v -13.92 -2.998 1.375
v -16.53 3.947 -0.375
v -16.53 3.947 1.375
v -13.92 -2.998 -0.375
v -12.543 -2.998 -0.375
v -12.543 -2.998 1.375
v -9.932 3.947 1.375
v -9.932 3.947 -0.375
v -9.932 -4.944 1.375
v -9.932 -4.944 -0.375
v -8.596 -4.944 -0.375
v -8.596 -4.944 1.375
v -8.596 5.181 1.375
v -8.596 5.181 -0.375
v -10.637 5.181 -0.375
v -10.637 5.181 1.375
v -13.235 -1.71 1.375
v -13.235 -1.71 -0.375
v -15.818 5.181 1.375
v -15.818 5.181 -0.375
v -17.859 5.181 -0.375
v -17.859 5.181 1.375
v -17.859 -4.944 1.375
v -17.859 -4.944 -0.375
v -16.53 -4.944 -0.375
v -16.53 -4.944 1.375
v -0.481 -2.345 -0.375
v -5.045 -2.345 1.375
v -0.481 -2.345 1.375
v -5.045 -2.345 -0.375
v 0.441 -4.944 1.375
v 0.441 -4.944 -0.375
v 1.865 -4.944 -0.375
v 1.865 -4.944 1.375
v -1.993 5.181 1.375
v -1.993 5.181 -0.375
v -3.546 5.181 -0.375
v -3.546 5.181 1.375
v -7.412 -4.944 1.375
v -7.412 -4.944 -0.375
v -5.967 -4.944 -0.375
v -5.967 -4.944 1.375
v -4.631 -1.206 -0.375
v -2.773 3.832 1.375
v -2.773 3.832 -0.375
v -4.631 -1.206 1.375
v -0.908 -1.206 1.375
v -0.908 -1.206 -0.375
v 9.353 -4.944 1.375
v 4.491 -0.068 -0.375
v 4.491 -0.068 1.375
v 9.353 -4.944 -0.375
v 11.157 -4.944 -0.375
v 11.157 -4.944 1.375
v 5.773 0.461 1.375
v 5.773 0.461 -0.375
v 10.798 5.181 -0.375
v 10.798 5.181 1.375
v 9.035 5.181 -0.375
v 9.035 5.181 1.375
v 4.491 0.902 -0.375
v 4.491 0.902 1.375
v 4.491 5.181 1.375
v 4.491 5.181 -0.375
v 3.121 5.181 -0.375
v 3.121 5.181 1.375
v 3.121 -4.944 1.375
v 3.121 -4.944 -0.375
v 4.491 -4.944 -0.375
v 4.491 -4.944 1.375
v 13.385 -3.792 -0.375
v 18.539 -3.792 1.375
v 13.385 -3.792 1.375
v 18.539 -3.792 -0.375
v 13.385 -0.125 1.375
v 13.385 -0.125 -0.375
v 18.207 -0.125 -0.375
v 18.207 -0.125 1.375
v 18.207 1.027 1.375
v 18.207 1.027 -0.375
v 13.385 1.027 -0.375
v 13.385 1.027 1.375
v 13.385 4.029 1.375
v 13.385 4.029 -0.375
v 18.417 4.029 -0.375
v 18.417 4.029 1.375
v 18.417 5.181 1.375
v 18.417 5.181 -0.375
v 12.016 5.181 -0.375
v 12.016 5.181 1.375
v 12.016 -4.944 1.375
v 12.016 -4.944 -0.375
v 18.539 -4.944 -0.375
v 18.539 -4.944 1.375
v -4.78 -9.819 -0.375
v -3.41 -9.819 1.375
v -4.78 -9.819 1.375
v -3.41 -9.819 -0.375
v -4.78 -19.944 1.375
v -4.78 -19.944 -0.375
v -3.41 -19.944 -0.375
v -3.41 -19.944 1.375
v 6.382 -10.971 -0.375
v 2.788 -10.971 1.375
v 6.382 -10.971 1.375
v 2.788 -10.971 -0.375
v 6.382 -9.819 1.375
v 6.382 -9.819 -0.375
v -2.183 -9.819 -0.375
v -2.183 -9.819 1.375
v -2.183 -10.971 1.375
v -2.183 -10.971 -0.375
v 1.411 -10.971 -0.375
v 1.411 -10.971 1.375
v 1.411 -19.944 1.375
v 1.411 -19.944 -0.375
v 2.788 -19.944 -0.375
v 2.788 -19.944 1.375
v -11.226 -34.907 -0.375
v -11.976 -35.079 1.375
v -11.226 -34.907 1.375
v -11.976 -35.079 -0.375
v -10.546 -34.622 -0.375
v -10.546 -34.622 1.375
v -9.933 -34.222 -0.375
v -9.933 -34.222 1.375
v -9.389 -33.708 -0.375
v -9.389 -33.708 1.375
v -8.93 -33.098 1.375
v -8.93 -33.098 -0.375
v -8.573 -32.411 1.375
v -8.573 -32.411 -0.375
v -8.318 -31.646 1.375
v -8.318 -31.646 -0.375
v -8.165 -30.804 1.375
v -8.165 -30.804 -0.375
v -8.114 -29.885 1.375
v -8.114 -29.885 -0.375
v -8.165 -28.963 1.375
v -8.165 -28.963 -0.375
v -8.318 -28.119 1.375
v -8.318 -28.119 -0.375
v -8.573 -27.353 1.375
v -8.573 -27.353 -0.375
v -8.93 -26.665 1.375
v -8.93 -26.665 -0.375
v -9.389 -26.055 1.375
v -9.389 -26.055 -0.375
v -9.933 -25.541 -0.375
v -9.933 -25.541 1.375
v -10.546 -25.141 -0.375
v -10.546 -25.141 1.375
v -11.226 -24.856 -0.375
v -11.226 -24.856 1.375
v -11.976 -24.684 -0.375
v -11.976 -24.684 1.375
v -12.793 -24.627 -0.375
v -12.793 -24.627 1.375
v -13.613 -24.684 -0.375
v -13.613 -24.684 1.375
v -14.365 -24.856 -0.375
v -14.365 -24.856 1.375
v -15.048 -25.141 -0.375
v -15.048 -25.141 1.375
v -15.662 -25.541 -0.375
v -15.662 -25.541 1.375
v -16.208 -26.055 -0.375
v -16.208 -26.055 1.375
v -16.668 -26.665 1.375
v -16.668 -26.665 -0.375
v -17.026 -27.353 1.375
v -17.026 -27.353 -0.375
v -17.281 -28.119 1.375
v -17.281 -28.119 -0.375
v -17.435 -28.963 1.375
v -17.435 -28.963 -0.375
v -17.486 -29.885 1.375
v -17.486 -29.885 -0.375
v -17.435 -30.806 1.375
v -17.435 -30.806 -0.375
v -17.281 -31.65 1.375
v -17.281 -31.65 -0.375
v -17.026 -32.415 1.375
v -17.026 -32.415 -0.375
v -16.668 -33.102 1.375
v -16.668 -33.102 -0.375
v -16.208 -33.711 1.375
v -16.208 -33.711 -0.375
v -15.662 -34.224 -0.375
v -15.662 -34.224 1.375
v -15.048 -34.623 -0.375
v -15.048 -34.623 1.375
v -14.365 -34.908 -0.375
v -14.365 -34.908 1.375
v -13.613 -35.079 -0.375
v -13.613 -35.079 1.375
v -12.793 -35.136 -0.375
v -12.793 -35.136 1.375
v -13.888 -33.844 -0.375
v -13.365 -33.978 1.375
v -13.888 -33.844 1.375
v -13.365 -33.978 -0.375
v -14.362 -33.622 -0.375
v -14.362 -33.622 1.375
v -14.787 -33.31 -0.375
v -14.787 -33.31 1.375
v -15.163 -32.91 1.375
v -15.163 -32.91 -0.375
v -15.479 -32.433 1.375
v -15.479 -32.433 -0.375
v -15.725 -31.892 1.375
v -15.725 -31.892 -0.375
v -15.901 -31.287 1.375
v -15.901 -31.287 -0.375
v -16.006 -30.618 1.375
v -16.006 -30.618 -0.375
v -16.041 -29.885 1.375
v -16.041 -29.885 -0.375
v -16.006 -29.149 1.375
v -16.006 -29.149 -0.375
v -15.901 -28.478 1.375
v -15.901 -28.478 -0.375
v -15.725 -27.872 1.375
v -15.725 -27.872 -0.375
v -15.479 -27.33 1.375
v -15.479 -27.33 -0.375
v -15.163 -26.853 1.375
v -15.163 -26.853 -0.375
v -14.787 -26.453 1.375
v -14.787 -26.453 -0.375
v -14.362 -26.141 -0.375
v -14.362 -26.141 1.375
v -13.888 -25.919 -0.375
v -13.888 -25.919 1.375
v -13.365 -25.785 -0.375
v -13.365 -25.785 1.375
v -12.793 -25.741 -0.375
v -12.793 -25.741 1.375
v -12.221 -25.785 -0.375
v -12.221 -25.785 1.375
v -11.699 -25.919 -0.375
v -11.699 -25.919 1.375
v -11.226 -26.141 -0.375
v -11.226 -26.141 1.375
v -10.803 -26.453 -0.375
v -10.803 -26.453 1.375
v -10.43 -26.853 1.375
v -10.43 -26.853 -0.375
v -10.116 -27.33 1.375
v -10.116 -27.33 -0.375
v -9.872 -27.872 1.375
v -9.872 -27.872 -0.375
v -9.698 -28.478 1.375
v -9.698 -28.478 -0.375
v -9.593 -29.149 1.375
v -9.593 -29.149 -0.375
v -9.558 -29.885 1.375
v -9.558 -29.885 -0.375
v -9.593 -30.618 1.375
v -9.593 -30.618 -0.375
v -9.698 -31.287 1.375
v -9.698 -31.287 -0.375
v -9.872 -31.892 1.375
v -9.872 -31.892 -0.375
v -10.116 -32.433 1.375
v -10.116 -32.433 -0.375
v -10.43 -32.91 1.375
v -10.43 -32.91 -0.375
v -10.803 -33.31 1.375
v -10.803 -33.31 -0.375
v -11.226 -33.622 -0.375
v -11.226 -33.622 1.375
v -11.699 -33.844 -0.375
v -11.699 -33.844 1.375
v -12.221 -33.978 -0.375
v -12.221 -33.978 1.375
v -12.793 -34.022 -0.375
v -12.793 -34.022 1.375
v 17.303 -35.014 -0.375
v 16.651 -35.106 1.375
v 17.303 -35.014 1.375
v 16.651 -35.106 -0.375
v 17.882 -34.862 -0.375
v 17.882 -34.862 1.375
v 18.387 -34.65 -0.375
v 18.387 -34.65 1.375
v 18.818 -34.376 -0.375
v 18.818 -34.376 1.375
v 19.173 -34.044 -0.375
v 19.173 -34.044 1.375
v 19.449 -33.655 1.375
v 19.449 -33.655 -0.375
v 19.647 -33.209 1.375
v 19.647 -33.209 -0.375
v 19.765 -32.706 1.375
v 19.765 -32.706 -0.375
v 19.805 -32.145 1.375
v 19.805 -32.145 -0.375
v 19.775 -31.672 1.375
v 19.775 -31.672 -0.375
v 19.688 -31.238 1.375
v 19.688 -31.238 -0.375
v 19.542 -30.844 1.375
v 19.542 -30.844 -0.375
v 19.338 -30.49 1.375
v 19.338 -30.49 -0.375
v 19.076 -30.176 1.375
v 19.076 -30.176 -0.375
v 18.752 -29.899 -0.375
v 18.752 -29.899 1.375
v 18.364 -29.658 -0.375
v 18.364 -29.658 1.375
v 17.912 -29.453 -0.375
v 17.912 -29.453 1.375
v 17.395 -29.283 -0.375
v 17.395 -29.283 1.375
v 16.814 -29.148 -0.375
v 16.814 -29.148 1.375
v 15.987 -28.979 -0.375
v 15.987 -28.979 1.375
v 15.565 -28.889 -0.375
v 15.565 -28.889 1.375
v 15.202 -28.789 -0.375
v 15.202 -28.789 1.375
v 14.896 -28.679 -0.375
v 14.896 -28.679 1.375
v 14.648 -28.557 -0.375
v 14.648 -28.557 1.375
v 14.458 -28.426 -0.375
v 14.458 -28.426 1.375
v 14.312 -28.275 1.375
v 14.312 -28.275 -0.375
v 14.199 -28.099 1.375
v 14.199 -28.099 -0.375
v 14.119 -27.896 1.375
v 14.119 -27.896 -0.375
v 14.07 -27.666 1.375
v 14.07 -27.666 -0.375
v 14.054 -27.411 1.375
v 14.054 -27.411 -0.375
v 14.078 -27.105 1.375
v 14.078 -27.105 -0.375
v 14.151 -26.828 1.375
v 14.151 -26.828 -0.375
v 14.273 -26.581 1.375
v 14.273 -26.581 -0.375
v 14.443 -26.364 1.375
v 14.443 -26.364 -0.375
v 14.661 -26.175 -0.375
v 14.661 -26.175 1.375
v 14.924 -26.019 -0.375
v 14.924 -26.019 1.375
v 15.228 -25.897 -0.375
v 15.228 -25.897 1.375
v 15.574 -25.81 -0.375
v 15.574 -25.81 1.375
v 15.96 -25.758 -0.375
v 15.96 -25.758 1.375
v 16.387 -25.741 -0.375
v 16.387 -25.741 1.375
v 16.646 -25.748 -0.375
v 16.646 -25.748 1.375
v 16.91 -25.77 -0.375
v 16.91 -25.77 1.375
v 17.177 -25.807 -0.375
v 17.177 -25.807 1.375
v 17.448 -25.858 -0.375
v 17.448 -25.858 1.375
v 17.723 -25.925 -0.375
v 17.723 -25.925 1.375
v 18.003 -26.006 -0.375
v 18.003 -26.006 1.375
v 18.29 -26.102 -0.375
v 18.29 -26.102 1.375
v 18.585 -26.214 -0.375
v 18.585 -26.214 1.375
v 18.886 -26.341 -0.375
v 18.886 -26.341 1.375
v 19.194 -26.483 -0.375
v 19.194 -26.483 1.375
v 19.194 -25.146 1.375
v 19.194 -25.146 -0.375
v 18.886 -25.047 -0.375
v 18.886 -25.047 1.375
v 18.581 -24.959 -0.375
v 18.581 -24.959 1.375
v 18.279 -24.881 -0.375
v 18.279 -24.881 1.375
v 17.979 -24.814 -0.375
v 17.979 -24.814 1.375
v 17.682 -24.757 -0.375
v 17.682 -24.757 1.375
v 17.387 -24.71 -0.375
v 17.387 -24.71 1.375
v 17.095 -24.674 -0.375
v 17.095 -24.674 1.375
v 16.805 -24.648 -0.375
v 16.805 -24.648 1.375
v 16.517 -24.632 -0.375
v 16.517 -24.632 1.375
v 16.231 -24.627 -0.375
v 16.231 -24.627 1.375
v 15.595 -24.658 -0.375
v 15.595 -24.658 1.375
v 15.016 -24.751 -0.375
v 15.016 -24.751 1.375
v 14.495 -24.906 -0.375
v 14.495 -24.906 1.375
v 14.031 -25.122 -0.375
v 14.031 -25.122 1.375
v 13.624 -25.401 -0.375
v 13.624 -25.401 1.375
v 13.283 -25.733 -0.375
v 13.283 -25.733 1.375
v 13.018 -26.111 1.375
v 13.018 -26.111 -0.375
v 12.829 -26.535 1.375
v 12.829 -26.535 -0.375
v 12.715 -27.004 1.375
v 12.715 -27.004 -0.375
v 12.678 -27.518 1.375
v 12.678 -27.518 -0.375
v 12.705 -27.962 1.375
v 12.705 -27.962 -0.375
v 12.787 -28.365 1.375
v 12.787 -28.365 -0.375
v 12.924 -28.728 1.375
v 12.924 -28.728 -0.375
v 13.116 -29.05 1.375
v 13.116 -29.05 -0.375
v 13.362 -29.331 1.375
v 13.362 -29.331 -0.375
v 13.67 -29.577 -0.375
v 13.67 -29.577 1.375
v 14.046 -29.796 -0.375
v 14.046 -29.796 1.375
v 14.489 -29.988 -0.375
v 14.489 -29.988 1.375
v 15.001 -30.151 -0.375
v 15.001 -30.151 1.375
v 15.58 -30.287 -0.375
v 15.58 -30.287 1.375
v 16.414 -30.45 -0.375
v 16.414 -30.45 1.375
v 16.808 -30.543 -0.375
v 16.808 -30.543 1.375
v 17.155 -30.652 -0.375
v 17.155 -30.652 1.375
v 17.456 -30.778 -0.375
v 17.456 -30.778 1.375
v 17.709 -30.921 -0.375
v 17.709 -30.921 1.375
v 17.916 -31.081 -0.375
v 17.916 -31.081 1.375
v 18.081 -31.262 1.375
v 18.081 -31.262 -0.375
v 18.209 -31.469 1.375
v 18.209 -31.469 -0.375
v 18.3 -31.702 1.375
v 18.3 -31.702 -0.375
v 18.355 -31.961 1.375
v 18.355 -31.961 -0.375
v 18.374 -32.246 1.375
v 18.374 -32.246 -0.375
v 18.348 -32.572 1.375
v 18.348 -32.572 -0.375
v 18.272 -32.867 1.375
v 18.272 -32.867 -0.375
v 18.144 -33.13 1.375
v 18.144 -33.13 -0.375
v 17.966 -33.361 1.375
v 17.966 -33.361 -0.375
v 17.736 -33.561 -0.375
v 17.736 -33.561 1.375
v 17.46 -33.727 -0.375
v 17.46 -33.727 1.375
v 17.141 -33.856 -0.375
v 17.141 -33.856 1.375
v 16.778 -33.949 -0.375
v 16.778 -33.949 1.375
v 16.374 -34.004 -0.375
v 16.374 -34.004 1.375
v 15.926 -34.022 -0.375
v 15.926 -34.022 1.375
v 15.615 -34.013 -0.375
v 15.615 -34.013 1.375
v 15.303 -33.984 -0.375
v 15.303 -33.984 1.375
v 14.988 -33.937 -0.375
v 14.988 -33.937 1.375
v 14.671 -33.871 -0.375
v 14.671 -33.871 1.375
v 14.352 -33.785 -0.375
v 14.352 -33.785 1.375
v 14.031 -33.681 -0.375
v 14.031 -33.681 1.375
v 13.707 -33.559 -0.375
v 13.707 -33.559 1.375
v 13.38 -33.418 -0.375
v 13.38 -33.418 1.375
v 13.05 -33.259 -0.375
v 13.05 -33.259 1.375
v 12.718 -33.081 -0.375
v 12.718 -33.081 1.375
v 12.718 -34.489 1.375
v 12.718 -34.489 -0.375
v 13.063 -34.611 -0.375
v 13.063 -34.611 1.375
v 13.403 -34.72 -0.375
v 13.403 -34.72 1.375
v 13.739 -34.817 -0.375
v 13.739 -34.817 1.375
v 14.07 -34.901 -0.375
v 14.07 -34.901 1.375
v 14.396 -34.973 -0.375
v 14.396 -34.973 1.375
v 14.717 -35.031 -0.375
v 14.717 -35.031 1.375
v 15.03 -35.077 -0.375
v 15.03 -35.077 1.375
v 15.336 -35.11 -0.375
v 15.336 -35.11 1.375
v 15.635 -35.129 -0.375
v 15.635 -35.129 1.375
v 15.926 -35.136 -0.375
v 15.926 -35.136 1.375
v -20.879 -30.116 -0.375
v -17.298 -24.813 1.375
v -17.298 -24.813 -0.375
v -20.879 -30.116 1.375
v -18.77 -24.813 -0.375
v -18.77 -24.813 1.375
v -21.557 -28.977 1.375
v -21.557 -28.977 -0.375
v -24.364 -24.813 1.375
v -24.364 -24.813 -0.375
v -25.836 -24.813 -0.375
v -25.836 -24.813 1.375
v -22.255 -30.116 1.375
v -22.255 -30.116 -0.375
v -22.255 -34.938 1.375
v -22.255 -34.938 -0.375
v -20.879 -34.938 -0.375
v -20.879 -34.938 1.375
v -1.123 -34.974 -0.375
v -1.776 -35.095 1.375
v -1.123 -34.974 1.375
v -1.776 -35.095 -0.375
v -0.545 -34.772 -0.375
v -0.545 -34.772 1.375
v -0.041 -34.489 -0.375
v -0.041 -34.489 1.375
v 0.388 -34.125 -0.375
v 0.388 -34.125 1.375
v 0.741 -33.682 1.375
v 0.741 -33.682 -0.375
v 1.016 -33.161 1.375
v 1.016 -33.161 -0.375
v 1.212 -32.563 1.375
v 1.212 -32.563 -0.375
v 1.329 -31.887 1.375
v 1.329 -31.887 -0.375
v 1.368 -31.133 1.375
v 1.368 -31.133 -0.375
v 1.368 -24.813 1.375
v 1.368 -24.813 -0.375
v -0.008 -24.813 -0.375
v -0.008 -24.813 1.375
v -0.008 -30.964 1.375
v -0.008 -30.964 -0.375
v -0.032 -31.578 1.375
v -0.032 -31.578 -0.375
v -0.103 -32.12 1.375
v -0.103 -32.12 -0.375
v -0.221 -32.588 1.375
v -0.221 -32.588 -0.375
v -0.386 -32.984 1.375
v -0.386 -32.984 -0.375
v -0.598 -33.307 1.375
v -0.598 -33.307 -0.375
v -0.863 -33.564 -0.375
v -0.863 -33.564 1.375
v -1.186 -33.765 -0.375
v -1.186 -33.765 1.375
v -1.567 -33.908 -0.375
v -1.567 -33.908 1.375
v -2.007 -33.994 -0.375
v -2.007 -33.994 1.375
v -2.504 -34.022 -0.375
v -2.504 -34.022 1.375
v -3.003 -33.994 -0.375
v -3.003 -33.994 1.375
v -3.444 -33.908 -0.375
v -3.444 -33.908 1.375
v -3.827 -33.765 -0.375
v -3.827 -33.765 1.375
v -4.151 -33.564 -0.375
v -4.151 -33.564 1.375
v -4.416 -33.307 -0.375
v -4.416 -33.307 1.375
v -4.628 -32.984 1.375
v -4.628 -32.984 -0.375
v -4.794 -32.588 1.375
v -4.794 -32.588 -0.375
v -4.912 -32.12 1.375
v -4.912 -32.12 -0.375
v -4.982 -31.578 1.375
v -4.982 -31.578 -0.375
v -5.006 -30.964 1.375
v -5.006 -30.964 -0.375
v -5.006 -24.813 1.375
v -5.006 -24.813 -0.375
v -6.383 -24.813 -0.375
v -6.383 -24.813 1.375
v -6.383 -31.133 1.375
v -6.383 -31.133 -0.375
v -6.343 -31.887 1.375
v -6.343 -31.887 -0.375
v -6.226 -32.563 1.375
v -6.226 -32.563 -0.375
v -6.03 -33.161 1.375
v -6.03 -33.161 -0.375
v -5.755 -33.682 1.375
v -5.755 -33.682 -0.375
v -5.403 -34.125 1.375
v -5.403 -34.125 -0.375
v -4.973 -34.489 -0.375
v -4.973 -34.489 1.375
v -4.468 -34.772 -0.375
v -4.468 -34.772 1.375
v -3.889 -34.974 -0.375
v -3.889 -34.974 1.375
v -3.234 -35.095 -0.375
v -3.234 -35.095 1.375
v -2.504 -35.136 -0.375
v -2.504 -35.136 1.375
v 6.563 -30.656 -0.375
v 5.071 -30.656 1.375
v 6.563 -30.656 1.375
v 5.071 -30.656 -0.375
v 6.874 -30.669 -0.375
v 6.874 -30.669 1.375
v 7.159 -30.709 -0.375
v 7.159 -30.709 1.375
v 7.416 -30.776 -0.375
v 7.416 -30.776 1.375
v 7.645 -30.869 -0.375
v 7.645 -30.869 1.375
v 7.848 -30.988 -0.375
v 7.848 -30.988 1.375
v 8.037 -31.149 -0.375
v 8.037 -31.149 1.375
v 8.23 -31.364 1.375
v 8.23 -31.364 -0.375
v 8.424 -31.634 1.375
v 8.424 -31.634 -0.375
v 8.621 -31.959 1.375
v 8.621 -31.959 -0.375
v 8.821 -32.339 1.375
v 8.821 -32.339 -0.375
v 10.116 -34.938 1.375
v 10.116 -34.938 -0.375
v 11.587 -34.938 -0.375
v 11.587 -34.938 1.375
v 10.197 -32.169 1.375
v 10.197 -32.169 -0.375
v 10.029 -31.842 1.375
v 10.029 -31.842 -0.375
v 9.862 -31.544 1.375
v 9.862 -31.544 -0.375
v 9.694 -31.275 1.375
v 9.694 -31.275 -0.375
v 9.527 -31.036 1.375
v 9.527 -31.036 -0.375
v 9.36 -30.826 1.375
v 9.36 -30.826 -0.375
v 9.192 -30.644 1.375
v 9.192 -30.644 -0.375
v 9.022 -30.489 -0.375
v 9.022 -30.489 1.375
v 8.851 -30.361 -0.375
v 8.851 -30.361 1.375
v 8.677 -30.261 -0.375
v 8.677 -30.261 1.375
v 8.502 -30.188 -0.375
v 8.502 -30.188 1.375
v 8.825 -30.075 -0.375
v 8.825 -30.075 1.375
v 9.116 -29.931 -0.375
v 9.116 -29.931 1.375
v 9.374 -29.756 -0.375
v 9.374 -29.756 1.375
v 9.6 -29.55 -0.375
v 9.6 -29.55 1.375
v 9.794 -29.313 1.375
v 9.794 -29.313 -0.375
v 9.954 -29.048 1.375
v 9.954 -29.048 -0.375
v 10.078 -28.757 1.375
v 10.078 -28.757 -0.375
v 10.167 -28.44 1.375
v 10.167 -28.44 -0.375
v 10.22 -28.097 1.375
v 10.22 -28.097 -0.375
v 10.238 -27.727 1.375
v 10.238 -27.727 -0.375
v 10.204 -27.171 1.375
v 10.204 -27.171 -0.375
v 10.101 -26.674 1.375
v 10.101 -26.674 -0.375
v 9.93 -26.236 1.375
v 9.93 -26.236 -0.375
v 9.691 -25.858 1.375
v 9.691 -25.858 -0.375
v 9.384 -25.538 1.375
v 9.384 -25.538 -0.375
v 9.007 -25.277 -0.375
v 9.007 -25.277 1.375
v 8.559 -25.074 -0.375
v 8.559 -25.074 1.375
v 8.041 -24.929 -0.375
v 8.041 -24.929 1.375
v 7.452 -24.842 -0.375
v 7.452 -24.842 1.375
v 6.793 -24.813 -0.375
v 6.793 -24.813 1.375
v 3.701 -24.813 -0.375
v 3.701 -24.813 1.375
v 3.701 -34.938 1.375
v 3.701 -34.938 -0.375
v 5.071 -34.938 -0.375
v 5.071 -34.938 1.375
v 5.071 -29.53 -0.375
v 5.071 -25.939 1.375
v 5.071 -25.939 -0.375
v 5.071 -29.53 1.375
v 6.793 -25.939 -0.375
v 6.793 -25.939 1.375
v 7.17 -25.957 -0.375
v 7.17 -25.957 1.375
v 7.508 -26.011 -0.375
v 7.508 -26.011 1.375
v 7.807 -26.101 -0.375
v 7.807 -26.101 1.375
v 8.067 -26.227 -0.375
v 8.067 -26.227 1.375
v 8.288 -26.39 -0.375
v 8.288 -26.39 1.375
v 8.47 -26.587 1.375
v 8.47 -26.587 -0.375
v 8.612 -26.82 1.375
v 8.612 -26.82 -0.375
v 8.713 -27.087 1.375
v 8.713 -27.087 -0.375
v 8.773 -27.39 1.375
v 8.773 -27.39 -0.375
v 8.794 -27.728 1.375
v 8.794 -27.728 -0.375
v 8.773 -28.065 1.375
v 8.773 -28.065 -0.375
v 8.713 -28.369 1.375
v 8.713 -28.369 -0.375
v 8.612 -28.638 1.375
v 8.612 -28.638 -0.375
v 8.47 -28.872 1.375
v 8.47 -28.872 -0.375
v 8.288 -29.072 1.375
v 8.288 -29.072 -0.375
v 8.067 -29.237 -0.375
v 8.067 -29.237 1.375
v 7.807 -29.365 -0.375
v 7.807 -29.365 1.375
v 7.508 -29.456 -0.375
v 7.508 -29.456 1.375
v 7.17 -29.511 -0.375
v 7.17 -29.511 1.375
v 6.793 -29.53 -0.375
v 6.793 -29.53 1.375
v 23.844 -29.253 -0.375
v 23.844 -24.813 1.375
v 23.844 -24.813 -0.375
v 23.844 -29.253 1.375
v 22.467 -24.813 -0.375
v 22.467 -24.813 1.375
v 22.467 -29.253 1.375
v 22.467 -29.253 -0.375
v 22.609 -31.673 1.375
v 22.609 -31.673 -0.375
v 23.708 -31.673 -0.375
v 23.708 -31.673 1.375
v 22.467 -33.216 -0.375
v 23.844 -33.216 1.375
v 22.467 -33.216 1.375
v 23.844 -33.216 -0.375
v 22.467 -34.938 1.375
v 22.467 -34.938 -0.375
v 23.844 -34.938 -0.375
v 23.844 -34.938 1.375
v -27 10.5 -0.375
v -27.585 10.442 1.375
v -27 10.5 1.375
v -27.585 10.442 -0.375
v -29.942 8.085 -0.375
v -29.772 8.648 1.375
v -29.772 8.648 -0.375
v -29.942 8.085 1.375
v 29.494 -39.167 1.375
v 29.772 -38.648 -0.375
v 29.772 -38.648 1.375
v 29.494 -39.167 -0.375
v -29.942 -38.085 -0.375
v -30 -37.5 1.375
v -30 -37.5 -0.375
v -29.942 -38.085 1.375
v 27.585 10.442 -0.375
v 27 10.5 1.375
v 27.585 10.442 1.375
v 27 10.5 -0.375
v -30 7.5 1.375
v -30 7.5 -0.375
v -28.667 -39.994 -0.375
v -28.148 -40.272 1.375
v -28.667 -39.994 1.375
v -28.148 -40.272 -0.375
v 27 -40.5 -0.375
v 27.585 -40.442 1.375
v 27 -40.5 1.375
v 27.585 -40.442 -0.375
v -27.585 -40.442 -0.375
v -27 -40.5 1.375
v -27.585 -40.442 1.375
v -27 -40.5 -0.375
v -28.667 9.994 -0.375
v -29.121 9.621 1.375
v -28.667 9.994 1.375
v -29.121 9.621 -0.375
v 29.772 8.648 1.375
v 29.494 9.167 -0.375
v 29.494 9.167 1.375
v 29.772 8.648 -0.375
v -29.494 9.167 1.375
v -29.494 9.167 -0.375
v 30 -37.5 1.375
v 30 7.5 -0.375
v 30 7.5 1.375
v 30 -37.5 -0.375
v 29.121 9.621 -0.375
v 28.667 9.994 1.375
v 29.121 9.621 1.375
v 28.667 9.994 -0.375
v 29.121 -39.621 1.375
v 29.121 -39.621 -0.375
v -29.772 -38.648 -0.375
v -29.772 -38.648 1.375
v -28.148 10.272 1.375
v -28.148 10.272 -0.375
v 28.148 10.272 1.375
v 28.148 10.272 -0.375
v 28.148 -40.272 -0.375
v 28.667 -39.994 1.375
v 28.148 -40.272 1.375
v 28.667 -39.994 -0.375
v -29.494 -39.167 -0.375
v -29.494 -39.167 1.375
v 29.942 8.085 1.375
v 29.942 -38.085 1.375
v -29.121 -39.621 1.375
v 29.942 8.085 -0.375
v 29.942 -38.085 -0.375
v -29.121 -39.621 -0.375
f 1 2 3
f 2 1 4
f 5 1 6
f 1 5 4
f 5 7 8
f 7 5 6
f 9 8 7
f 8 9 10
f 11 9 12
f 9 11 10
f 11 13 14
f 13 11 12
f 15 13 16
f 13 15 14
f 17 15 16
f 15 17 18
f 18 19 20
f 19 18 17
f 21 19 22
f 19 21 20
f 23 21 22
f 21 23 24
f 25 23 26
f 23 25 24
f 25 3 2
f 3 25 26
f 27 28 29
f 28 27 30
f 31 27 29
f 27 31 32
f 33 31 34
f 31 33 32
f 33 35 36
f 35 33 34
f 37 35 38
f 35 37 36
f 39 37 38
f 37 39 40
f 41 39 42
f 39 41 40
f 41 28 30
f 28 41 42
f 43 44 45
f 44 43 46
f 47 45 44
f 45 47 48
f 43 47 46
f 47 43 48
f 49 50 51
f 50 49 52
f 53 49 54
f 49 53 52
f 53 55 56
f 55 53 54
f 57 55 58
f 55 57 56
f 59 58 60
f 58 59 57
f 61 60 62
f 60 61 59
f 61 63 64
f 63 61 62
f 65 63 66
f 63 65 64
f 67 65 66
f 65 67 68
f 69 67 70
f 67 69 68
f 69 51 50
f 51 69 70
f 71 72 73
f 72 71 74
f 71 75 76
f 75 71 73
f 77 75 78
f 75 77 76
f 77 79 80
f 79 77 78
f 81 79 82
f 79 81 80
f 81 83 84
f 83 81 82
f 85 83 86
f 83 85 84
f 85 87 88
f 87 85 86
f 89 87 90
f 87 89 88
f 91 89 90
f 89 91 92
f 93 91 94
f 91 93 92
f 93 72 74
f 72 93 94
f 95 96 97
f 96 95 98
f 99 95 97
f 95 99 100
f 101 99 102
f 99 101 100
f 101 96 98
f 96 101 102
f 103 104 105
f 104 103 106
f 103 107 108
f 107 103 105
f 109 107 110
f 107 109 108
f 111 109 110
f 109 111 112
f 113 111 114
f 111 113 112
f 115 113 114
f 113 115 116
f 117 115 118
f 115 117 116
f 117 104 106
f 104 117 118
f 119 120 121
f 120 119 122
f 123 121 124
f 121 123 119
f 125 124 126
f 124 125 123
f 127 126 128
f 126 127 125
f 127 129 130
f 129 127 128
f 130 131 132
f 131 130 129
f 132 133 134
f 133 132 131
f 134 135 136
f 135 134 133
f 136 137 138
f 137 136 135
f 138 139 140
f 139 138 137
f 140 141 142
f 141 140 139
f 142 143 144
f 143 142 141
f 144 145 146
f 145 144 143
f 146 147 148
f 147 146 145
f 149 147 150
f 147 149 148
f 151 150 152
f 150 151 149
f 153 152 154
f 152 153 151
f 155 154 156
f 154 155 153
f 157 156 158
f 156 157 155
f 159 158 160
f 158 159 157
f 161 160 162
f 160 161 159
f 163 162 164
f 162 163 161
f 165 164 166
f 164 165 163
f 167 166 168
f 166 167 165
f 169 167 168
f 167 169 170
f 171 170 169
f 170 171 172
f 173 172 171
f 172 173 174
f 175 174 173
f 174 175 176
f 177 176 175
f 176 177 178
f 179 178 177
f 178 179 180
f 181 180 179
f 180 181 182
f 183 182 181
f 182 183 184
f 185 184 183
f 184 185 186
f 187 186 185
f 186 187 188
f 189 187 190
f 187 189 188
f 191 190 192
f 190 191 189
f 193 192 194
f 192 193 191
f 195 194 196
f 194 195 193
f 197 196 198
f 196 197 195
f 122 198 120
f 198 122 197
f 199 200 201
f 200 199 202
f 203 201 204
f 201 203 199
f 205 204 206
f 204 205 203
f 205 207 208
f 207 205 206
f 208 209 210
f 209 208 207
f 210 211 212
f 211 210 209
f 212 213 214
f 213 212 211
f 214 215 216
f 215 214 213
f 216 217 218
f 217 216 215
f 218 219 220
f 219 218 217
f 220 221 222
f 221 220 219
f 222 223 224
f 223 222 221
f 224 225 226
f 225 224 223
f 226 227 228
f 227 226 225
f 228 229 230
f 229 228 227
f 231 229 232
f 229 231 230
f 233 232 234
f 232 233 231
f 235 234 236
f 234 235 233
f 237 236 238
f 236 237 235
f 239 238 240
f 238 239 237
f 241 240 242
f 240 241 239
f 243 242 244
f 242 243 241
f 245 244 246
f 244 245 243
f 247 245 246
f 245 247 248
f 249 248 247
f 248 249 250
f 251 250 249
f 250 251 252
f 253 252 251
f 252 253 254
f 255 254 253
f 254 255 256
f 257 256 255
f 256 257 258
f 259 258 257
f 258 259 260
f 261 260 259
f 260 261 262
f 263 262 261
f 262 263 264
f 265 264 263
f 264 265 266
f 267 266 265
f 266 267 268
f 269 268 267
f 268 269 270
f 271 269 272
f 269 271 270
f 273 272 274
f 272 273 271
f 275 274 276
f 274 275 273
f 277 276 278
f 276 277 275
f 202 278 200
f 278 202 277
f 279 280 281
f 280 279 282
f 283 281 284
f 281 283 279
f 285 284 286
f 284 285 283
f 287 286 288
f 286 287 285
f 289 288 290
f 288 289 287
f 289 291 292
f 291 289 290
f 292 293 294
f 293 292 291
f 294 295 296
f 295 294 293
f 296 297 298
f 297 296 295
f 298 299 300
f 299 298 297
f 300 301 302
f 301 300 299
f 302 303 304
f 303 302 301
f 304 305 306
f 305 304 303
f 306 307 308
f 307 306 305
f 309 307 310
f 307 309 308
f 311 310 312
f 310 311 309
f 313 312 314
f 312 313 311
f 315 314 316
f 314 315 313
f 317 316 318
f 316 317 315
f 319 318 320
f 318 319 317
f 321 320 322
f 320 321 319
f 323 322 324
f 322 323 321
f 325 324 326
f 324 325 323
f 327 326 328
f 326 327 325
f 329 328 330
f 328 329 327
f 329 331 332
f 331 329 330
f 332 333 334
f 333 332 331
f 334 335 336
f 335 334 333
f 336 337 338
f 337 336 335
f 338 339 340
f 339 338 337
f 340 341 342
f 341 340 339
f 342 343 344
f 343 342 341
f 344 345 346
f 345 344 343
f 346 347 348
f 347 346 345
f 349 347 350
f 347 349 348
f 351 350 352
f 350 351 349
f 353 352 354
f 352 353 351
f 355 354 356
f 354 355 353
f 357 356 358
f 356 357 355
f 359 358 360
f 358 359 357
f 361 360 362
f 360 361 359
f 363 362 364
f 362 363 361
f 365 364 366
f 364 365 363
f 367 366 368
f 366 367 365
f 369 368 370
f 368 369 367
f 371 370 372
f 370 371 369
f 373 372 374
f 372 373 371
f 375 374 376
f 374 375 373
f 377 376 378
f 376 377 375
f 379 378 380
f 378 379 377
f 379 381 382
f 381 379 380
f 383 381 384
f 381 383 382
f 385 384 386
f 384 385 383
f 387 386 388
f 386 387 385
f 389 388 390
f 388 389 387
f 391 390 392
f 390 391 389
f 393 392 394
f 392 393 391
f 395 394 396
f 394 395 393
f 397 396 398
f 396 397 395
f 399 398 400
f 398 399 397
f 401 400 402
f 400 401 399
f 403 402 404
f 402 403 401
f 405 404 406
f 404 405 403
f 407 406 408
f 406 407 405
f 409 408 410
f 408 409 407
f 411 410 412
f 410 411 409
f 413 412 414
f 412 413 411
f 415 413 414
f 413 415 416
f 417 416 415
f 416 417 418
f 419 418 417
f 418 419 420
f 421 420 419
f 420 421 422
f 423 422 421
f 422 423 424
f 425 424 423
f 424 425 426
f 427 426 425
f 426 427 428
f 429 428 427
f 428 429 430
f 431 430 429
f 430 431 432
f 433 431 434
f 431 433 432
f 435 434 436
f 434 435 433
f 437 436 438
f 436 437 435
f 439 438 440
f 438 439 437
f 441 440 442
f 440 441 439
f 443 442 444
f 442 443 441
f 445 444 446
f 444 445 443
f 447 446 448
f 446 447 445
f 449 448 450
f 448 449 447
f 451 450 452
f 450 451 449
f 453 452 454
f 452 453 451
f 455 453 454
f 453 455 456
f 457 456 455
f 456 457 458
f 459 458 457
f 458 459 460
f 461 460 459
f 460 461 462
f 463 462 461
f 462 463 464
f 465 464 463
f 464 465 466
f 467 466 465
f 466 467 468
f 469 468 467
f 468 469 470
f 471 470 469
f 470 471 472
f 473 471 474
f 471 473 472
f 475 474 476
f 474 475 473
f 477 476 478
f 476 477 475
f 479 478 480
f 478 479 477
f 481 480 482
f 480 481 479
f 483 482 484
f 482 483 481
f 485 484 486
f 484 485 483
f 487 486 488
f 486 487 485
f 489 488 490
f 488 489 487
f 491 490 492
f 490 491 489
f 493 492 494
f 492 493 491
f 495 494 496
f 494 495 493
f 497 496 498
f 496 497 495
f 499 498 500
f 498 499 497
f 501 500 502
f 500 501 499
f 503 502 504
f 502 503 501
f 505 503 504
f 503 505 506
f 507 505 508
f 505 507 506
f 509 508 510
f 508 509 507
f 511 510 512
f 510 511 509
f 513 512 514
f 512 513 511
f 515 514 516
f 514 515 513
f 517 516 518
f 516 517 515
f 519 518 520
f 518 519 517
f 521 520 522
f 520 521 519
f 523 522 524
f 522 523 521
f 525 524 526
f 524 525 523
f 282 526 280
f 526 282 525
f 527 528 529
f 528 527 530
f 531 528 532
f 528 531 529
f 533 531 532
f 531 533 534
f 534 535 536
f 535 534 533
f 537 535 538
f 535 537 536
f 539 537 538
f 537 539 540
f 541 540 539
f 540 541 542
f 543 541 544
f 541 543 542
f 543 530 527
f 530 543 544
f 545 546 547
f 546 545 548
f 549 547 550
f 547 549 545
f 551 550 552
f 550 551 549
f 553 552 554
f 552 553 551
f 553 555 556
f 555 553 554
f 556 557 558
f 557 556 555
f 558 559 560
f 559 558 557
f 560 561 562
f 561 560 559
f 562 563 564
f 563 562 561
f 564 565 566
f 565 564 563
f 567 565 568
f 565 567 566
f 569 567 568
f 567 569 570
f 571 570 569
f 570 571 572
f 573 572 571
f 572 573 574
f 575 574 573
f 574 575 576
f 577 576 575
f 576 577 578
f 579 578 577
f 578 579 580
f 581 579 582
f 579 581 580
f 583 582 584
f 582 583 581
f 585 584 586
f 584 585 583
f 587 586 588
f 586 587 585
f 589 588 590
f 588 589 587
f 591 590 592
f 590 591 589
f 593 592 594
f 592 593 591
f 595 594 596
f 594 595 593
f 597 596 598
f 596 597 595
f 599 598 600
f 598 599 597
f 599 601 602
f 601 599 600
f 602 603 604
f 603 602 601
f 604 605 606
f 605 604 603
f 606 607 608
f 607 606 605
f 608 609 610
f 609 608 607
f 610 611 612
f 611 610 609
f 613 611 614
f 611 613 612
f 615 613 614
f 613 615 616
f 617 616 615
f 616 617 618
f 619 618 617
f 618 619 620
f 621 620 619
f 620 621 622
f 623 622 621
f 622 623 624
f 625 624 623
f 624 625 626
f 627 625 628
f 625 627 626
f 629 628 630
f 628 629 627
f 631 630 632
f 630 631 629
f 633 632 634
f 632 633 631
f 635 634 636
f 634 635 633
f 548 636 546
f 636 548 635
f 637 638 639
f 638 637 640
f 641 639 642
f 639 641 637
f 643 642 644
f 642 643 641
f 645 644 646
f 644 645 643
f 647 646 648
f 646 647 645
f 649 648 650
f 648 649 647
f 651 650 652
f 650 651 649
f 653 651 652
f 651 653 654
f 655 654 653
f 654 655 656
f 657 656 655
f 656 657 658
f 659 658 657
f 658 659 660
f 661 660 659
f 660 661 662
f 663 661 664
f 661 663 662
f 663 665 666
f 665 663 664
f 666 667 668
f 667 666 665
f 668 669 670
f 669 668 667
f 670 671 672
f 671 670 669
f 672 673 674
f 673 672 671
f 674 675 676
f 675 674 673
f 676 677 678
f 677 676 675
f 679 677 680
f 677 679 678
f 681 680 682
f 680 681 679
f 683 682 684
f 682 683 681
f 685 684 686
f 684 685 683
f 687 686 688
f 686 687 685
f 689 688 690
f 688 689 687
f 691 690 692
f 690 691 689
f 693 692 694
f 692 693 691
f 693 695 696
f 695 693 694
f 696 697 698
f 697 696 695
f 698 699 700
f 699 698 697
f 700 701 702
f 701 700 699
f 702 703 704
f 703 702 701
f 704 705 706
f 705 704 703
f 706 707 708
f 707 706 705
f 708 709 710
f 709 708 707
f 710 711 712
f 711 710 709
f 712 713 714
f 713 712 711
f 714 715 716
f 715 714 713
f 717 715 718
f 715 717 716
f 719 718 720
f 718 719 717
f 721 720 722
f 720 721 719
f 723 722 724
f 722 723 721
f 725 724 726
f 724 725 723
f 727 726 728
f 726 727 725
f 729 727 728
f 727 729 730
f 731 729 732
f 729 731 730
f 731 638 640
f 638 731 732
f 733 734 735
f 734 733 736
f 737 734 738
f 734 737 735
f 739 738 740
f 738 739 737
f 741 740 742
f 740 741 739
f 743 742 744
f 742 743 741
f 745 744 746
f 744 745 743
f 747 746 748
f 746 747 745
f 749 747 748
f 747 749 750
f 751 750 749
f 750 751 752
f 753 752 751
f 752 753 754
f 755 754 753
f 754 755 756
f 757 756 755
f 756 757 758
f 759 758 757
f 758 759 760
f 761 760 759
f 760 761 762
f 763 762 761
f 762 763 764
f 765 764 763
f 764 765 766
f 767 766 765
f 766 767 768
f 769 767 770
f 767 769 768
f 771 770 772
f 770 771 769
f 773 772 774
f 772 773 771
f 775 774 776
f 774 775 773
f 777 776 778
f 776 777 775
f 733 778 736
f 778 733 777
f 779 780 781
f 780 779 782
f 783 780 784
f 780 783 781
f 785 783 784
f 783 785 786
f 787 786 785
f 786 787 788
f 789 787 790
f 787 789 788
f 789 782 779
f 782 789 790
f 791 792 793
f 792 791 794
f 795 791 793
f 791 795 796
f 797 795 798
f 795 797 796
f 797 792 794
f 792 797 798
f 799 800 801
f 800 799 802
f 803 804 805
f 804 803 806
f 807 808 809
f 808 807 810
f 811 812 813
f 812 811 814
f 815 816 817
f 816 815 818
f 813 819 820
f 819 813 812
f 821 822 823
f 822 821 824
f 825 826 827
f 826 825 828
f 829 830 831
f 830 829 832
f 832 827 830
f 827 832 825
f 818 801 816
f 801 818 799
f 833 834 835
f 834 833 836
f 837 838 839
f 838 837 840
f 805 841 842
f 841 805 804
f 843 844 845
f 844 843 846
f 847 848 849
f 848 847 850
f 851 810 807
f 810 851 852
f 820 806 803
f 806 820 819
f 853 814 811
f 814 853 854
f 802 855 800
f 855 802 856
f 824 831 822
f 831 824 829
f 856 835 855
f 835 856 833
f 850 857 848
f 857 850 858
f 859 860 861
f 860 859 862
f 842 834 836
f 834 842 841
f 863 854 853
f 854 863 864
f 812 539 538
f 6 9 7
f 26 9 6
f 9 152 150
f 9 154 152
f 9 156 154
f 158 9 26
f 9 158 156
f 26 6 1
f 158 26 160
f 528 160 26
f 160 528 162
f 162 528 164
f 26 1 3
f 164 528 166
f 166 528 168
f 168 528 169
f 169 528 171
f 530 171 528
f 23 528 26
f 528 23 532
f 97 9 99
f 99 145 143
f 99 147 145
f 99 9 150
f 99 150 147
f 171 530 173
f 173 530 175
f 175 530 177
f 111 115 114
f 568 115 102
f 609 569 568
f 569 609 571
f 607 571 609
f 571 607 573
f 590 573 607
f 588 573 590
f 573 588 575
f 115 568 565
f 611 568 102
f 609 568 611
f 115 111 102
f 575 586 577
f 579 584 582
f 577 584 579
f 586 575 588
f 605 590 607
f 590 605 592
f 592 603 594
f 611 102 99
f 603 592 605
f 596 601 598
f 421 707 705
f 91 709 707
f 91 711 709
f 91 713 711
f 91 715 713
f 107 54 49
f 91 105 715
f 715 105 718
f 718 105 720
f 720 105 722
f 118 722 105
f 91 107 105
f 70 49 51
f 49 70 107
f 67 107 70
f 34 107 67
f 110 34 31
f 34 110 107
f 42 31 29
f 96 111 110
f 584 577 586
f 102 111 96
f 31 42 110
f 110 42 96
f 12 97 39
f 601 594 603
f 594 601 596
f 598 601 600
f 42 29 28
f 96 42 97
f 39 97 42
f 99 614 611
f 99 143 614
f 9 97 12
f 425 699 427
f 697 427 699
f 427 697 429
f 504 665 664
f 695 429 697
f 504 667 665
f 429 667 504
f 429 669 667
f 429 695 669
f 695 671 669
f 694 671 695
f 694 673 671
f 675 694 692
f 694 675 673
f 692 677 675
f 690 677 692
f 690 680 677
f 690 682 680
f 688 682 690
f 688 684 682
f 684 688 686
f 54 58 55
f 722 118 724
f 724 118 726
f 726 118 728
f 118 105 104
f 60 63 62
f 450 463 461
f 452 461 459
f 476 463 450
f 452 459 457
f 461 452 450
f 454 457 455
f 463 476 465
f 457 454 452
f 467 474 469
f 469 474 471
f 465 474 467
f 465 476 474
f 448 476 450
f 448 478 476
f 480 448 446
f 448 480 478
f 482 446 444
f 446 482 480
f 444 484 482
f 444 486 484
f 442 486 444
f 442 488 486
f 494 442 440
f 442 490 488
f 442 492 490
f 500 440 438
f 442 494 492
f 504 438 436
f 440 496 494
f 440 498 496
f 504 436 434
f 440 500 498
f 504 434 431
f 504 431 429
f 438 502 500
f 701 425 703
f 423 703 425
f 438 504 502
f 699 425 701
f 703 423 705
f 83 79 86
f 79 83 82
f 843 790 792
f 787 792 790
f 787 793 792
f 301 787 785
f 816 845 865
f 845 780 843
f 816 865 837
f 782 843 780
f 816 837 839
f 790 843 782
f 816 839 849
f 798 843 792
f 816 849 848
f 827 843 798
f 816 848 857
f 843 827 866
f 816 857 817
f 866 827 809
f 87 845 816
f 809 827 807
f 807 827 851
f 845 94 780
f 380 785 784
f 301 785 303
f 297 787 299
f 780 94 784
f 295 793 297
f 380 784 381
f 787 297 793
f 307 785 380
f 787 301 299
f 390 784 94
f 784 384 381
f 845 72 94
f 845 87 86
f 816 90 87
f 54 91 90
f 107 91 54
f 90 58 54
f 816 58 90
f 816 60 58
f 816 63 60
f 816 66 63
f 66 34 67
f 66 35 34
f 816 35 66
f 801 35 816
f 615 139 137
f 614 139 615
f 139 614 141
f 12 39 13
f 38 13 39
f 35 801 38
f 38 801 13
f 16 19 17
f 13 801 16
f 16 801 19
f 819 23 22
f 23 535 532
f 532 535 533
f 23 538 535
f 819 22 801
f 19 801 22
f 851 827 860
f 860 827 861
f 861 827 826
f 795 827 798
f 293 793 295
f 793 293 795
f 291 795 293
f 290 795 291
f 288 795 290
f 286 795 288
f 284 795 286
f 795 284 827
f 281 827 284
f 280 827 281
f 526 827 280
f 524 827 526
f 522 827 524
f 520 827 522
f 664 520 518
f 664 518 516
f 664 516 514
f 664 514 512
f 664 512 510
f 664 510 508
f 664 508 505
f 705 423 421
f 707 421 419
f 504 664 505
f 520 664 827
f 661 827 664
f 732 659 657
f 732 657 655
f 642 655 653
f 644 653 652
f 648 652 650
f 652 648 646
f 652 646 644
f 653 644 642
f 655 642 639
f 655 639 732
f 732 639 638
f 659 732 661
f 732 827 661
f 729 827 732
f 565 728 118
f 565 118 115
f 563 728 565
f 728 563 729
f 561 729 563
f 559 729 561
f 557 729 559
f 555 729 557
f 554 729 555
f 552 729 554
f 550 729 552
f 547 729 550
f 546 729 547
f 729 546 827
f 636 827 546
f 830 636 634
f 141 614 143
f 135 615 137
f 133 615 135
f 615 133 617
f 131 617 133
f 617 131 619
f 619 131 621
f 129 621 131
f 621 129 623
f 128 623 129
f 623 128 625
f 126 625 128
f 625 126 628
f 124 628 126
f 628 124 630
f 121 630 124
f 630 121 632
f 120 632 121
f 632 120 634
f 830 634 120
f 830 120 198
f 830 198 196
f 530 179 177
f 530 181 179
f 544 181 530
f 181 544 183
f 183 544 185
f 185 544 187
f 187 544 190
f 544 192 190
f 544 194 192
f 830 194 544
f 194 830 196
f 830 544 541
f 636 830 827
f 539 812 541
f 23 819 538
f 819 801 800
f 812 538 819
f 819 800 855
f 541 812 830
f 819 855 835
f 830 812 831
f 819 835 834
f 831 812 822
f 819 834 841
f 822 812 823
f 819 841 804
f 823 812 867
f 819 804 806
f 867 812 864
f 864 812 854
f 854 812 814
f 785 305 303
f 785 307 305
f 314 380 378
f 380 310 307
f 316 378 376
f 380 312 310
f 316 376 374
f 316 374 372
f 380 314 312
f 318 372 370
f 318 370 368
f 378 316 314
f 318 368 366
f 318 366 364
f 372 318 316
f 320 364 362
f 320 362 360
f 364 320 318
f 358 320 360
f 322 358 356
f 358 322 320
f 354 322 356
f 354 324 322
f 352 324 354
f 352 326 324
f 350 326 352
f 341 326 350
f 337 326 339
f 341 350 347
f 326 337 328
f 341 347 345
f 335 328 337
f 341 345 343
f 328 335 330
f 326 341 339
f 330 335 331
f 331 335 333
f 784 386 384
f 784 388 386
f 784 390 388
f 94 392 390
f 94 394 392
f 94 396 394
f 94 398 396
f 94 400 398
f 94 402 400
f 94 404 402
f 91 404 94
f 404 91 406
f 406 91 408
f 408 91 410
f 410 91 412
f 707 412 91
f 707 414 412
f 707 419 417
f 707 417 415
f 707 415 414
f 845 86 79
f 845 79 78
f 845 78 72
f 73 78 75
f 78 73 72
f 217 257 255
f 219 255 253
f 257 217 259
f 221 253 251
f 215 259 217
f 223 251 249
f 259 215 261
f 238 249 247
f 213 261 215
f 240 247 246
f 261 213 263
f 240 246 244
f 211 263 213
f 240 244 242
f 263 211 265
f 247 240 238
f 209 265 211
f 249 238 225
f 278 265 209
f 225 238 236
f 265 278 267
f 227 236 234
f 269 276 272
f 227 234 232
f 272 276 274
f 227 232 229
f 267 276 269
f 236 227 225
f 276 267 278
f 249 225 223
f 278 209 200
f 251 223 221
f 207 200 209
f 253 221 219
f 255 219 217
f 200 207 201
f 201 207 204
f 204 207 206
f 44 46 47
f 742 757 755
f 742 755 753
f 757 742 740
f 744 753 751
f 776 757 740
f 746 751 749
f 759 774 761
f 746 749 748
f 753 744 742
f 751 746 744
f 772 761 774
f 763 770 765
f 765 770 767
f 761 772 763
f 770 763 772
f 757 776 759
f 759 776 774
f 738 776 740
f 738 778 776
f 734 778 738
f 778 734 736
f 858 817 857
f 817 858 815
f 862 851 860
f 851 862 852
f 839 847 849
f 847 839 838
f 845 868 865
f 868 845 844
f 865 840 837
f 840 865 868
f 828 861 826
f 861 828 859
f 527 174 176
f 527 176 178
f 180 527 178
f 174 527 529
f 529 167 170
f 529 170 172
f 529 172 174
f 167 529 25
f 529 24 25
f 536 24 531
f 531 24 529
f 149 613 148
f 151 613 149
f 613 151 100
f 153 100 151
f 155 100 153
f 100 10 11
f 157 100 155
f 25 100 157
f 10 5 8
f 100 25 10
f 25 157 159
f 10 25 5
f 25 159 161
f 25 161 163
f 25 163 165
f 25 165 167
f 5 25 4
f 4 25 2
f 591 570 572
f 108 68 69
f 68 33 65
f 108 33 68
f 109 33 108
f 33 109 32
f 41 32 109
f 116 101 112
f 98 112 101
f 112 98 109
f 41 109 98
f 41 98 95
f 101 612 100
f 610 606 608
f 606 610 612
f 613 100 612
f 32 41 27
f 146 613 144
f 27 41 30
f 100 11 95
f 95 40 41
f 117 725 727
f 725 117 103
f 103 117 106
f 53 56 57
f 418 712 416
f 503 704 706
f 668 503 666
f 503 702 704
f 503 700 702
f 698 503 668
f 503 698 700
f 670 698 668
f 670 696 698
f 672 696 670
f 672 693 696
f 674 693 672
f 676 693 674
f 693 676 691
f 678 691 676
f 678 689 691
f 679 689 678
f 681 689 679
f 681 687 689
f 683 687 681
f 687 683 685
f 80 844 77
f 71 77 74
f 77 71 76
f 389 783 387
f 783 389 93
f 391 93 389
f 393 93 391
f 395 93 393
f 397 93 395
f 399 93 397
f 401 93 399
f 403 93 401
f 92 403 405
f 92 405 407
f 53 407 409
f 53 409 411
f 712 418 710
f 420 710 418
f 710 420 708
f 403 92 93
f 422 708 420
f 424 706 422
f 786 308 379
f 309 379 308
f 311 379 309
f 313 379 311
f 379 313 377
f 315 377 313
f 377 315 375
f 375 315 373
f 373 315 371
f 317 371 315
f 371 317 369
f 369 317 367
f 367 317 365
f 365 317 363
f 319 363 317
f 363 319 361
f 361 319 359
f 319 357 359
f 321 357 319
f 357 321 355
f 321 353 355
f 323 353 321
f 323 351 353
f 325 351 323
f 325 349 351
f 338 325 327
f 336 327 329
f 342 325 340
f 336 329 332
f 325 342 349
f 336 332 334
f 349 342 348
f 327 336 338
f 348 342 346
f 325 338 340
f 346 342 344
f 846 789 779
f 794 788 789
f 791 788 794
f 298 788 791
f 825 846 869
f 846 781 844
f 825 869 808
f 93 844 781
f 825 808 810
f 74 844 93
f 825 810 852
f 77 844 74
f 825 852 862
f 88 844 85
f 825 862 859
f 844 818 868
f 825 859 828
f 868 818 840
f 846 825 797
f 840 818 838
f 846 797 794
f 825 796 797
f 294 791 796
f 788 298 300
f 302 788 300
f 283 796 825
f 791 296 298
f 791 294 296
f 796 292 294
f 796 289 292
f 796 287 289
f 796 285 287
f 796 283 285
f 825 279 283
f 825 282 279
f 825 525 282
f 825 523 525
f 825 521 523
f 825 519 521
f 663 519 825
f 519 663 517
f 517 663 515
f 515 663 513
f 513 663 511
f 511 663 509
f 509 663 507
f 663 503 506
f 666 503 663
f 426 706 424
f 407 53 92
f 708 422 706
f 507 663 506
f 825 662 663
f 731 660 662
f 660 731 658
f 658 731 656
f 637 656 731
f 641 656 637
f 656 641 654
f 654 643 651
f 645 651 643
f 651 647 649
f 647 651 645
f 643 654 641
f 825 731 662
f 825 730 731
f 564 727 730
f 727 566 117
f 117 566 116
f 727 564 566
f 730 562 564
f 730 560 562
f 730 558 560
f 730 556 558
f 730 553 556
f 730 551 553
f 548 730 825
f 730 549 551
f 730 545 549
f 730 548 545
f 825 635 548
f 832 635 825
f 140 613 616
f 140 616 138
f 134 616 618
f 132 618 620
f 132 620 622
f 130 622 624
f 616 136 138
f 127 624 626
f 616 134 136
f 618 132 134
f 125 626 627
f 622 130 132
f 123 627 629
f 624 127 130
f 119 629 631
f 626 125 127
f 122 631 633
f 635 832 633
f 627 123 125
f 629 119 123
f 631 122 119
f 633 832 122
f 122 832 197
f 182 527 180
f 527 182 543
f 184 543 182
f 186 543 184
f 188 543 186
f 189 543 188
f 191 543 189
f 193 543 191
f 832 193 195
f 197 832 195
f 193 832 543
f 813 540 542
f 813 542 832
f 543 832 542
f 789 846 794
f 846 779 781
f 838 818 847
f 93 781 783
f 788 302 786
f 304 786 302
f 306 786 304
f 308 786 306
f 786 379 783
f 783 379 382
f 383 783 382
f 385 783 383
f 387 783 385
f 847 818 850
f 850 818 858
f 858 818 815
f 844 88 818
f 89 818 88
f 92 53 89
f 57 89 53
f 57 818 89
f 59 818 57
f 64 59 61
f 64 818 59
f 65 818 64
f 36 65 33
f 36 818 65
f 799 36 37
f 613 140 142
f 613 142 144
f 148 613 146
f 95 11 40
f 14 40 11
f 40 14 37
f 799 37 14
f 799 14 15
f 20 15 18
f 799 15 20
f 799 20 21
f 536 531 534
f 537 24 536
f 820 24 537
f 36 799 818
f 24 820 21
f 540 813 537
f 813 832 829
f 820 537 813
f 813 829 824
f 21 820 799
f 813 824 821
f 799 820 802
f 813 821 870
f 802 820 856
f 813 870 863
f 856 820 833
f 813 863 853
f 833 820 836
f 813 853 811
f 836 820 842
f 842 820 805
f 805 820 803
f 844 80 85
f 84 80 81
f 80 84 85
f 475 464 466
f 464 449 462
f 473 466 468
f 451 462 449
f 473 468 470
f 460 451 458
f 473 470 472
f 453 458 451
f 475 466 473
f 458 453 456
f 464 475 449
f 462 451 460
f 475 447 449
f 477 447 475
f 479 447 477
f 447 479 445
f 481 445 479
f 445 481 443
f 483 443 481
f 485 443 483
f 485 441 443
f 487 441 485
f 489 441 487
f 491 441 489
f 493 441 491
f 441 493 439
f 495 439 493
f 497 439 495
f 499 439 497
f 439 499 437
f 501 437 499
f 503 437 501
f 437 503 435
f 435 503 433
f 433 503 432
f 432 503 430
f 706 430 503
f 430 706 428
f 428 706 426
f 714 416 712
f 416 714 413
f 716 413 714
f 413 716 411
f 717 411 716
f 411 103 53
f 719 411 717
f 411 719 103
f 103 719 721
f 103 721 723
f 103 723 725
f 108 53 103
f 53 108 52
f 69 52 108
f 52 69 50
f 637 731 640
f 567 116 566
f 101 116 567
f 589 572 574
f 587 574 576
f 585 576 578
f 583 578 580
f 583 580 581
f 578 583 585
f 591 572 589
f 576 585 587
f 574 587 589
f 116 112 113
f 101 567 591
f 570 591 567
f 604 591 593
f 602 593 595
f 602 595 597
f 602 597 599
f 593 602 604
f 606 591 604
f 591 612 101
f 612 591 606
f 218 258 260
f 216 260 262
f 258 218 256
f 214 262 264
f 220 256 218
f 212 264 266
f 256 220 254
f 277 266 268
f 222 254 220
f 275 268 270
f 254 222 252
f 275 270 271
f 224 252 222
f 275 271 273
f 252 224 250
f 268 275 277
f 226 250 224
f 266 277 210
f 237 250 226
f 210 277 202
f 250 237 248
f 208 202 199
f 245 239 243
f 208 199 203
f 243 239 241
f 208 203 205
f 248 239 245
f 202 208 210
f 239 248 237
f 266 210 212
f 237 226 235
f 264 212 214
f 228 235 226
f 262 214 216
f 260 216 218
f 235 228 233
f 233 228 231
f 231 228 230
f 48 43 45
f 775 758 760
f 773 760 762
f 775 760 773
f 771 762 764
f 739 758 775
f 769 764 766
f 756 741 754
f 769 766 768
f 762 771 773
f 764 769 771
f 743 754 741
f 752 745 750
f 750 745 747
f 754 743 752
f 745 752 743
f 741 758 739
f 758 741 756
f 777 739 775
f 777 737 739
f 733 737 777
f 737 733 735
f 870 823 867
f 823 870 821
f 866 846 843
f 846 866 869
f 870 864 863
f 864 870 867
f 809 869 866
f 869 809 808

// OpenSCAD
line1="MAKE";
line2="IT";
line3="YOURS!";
border=12;

difference() {
    $fn=32;
    minkowski() {
        union(){
            cube([max(len(line1),len(line2),len(line3))*7+border,15,0.75], center=true);
            if(line2||line3) {
                translate([0,-15,0]) cube([max(len(line1),len(line2),len(line3))*7+border,15,0.75], center=true);
            }
            if(line3) {
                translate([0,-30,0]) cube([max(len(line1),len(line2),len(line3))*7+border,15,0.75], center=true);
            }
        }
        cylinder(r=3,h=1);
    }
    
    union() {
            linear_extrude(height = 3, center=true) text(line1, font = "Allerta Stencil", "center", size = 10, valign="center", halign="center");
        if(line2) {
            translate([0,-15,0]) linear_extrude(height = 3, center=true) text(line2, font = "Allerta Stencil", "center", size = 10, valign="center", halign="center");
        }
        if(line3) {
            translate([0,-30,0]) linear_extrude(height = 3, center=true) text(line3, font = "Allerta Stencil", "center", size = 10, valign="center", halign="center");
        }
    }
}
